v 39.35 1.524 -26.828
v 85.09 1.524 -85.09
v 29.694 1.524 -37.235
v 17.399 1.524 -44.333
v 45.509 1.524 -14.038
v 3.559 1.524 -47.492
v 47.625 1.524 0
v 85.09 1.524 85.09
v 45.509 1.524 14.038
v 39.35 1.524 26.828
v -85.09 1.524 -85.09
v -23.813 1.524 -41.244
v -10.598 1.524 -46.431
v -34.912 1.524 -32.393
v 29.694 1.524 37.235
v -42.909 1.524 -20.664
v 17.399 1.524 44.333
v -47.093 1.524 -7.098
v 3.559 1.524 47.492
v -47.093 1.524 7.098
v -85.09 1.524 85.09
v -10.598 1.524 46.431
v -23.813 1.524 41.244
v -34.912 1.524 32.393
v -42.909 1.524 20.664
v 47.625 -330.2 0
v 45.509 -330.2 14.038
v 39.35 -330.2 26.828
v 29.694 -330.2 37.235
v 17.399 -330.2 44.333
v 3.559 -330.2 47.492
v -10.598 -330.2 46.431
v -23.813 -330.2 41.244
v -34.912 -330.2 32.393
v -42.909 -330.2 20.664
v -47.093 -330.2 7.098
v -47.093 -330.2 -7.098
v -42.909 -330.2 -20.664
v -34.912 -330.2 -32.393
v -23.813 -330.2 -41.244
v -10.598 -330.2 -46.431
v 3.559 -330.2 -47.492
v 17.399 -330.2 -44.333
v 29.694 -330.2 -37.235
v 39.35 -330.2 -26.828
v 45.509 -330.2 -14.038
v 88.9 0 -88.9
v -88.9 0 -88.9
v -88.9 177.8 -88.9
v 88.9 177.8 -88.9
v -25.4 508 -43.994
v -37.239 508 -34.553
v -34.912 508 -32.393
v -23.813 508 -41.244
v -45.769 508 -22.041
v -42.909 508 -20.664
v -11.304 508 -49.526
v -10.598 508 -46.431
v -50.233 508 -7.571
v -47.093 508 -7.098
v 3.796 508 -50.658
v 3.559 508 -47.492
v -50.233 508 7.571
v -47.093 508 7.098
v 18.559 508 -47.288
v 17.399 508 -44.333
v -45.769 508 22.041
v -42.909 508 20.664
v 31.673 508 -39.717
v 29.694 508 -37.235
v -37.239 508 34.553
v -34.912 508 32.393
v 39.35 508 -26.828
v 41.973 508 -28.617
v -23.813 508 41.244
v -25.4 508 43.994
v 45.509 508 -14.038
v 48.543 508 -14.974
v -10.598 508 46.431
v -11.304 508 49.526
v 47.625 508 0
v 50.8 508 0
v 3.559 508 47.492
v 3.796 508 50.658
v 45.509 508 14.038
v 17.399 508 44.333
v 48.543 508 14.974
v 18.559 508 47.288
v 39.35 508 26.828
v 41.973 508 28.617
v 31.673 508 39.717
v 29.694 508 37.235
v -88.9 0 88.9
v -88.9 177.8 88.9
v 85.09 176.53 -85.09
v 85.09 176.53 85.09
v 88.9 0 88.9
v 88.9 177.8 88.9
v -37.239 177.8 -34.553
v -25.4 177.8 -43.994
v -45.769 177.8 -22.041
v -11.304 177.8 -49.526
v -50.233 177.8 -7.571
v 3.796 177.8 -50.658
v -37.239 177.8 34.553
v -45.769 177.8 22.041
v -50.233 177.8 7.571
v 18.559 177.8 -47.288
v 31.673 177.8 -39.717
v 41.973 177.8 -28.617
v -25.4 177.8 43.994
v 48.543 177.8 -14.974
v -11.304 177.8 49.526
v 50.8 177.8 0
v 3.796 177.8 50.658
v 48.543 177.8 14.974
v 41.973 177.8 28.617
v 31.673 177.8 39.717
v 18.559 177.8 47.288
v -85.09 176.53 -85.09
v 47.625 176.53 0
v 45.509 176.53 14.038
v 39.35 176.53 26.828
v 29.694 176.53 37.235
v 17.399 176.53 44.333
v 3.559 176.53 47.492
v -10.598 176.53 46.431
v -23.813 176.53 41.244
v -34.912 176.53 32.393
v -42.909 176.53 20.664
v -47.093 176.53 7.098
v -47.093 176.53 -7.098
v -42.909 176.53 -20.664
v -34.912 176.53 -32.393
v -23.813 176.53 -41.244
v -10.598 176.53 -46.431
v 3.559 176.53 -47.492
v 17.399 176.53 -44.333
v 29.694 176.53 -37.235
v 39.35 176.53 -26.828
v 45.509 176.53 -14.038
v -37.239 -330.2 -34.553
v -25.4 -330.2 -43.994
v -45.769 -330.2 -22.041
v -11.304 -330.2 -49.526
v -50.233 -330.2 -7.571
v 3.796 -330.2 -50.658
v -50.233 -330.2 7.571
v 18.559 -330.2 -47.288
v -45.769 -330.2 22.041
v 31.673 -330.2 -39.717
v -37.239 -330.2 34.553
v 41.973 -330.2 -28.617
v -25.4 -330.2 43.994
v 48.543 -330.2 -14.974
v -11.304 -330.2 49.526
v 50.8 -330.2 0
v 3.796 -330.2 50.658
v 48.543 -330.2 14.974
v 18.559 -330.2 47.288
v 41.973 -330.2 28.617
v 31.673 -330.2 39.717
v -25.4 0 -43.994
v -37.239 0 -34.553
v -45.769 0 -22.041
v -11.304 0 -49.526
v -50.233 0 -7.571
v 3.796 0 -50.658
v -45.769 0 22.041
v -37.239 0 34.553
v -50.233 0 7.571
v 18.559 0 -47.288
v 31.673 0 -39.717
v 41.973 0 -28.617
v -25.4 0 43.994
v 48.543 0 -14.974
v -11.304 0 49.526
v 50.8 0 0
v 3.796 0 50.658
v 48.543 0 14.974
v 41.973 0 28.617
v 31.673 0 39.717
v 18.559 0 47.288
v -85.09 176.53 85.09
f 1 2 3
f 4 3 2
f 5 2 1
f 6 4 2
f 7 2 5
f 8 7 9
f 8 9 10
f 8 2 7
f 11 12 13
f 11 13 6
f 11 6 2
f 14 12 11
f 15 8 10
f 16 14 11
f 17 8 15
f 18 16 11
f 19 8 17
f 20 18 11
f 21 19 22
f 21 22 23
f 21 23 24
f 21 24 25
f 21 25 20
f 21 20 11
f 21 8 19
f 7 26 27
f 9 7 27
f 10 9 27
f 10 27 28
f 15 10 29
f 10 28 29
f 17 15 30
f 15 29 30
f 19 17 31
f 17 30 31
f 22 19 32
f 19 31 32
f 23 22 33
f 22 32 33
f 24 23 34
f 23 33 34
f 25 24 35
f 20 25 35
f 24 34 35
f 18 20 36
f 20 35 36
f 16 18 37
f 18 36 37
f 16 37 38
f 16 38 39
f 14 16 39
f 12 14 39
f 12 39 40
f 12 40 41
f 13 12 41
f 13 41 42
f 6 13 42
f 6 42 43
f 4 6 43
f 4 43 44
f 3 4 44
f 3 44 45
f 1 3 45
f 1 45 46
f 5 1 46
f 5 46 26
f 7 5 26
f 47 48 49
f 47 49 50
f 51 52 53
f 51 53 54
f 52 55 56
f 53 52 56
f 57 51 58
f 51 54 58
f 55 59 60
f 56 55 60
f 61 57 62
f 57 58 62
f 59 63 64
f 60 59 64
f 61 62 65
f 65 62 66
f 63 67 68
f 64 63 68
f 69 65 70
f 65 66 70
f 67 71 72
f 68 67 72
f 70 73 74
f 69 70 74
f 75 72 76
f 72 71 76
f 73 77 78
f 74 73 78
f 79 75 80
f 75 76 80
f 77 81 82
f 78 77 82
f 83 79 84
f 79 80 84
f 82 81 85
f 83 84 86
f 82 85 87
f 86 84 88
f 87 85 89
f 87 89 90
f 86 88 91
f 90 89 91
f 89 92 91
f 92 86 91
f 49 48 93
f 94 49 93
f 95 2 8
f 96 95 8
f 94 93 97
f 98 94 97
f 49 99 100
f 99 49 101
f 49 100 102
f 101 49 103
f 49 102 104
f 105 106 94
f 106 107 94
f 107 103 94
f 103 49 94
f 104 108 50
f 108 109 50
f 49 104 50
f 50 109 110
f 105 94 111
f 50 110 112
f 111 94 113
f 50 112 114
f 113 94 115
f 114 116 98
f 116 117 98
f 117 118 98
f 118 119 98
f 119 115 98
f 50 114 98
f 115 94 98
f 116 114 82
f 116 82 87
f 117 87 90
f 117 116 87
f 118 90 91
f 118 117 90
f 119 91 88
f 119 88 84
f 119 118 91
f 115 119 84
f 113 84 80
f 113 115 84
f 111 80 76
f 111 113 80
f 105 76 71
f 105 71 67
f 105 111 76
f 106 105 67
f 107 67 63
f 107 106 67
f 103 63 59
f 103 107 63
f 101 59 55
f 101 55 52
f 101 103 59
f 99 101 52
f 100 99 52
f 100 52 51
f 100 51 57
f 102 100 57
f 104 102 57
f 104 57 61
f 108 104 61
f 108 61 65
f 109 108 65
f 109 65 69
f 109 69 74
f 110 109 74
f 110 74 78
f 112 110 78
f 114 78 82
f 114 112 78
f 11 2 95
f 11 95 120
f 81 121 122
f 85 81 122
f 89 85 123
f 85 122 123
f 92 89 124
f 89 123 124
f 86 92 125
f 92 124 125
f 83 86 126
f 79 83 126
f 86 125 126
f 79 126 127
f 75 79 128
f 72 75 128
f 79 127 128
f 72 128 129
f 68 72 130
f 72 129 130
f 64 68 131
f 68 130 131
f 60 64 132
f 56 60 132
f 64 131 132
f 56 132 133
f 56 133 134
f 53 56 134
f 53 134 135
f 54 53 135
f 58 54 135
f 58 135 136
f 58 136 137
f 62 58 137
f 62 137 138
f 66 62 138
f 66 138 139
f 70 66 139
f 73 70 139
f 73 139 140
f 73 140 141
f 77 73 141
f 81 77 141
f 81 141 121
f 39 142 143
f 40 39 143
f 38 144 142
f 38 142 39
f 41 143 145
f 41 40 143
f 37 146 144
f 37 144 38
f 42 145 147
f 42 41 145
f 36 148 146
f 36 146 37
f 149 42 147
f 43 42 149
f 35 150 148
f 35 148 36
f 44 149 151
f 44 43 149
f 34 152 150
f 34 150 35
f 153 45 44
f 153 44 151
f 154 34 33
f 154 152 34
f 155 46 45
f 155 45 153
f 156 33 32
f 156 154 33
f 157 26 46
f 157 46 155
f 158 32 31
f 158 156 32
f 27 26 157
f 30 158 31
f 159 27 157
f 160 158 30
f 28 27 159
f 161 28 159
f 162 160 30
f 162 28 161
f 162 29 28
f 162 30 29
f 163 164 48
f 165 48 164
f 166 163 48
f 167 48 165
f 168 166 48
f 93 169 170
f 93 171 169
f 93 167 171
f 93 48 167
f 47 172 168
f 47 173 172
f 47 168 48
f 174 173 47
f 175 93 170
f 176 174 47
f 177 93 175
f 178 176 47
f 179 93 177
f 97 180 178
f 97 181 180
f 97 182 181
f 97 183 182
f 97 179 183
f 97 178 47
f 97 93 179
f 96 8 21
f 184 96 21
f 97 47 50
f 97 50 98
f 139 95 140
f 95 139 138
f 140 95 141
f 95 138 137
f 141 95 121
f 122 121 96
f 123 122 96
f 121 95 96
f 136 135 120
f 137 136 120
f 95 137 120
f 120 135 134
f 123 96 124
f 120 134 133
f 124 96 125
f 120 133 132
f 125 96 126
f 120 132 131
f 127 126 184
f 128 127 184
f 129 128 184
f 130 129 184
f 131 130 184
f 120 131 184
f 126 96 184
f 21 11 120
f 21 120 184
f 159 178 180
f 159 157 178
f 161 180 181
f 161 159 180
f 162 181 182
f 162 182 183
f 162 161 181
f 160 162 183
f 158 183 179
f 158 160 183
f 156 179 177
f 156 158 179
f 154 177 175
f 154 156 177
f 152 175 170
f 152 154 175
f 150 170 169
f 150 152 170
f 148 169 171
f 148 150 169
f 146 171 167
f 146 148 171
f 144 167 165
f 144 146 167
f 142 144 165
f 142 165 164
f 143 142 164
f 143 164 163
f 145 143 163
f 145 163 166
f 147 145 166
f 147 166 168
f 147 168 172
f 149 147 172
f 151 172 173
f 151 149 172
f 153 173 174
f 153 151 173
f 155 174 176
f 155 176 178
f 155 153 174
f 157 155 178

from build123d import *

# Parameters (mm, degrees)
F0_R          = 50.8
F1_DEPTH      = 330.2
F1_DEPTH_BACK = 508
F3_W          = 177.8
F3_H          = 177.8
F4_DEPTH      = 177.8
F6_START      = -1.27
F5_W          = 170.18
F5_H          = 170.18
F6_DEPTH      = 175.006
F2_R          = 47.625
F7_DEPTH      = 914.4


with BuildPart() as f1:
    # F0 (on Front) → F1 (new body, two sides)
    with BuildSketch(Plane.XZ) as f1_sk:
        Circle(F0_R)
    extrude(amount=F1_DEPTH)
    extrude(f1_sk.sketch, amount=-F1_DEPTH_BACK)

    # F3 (on Front) → F4 (join)
    with BuildSketch(Plane.XZ):
        Rectangle(F3_W, F3_H)
    extrude(amount=-F4_DEPTH)

    # F5 (on face) → F6 (cut)
    with BuildSketch(Plane(origin=(0, 177.8, 0), x_dir=(-1, 0, 0), z_dir=(0, 1, 0)).offset(F6_START)):
        Rectangle(F5_W, F5_H)
    extrude(amount=-F6_DEPTH, mode=Mode.SUBTRACT)

    # F2 (on face) → F7 (cut)
    with BuildSketch(Plane.XZ.offset(330.2)):
        Circle(F2_R)
    extrude(amount=-F7_DEPTH, mode=Mode.SUBTRACT)


solid = f1.part
